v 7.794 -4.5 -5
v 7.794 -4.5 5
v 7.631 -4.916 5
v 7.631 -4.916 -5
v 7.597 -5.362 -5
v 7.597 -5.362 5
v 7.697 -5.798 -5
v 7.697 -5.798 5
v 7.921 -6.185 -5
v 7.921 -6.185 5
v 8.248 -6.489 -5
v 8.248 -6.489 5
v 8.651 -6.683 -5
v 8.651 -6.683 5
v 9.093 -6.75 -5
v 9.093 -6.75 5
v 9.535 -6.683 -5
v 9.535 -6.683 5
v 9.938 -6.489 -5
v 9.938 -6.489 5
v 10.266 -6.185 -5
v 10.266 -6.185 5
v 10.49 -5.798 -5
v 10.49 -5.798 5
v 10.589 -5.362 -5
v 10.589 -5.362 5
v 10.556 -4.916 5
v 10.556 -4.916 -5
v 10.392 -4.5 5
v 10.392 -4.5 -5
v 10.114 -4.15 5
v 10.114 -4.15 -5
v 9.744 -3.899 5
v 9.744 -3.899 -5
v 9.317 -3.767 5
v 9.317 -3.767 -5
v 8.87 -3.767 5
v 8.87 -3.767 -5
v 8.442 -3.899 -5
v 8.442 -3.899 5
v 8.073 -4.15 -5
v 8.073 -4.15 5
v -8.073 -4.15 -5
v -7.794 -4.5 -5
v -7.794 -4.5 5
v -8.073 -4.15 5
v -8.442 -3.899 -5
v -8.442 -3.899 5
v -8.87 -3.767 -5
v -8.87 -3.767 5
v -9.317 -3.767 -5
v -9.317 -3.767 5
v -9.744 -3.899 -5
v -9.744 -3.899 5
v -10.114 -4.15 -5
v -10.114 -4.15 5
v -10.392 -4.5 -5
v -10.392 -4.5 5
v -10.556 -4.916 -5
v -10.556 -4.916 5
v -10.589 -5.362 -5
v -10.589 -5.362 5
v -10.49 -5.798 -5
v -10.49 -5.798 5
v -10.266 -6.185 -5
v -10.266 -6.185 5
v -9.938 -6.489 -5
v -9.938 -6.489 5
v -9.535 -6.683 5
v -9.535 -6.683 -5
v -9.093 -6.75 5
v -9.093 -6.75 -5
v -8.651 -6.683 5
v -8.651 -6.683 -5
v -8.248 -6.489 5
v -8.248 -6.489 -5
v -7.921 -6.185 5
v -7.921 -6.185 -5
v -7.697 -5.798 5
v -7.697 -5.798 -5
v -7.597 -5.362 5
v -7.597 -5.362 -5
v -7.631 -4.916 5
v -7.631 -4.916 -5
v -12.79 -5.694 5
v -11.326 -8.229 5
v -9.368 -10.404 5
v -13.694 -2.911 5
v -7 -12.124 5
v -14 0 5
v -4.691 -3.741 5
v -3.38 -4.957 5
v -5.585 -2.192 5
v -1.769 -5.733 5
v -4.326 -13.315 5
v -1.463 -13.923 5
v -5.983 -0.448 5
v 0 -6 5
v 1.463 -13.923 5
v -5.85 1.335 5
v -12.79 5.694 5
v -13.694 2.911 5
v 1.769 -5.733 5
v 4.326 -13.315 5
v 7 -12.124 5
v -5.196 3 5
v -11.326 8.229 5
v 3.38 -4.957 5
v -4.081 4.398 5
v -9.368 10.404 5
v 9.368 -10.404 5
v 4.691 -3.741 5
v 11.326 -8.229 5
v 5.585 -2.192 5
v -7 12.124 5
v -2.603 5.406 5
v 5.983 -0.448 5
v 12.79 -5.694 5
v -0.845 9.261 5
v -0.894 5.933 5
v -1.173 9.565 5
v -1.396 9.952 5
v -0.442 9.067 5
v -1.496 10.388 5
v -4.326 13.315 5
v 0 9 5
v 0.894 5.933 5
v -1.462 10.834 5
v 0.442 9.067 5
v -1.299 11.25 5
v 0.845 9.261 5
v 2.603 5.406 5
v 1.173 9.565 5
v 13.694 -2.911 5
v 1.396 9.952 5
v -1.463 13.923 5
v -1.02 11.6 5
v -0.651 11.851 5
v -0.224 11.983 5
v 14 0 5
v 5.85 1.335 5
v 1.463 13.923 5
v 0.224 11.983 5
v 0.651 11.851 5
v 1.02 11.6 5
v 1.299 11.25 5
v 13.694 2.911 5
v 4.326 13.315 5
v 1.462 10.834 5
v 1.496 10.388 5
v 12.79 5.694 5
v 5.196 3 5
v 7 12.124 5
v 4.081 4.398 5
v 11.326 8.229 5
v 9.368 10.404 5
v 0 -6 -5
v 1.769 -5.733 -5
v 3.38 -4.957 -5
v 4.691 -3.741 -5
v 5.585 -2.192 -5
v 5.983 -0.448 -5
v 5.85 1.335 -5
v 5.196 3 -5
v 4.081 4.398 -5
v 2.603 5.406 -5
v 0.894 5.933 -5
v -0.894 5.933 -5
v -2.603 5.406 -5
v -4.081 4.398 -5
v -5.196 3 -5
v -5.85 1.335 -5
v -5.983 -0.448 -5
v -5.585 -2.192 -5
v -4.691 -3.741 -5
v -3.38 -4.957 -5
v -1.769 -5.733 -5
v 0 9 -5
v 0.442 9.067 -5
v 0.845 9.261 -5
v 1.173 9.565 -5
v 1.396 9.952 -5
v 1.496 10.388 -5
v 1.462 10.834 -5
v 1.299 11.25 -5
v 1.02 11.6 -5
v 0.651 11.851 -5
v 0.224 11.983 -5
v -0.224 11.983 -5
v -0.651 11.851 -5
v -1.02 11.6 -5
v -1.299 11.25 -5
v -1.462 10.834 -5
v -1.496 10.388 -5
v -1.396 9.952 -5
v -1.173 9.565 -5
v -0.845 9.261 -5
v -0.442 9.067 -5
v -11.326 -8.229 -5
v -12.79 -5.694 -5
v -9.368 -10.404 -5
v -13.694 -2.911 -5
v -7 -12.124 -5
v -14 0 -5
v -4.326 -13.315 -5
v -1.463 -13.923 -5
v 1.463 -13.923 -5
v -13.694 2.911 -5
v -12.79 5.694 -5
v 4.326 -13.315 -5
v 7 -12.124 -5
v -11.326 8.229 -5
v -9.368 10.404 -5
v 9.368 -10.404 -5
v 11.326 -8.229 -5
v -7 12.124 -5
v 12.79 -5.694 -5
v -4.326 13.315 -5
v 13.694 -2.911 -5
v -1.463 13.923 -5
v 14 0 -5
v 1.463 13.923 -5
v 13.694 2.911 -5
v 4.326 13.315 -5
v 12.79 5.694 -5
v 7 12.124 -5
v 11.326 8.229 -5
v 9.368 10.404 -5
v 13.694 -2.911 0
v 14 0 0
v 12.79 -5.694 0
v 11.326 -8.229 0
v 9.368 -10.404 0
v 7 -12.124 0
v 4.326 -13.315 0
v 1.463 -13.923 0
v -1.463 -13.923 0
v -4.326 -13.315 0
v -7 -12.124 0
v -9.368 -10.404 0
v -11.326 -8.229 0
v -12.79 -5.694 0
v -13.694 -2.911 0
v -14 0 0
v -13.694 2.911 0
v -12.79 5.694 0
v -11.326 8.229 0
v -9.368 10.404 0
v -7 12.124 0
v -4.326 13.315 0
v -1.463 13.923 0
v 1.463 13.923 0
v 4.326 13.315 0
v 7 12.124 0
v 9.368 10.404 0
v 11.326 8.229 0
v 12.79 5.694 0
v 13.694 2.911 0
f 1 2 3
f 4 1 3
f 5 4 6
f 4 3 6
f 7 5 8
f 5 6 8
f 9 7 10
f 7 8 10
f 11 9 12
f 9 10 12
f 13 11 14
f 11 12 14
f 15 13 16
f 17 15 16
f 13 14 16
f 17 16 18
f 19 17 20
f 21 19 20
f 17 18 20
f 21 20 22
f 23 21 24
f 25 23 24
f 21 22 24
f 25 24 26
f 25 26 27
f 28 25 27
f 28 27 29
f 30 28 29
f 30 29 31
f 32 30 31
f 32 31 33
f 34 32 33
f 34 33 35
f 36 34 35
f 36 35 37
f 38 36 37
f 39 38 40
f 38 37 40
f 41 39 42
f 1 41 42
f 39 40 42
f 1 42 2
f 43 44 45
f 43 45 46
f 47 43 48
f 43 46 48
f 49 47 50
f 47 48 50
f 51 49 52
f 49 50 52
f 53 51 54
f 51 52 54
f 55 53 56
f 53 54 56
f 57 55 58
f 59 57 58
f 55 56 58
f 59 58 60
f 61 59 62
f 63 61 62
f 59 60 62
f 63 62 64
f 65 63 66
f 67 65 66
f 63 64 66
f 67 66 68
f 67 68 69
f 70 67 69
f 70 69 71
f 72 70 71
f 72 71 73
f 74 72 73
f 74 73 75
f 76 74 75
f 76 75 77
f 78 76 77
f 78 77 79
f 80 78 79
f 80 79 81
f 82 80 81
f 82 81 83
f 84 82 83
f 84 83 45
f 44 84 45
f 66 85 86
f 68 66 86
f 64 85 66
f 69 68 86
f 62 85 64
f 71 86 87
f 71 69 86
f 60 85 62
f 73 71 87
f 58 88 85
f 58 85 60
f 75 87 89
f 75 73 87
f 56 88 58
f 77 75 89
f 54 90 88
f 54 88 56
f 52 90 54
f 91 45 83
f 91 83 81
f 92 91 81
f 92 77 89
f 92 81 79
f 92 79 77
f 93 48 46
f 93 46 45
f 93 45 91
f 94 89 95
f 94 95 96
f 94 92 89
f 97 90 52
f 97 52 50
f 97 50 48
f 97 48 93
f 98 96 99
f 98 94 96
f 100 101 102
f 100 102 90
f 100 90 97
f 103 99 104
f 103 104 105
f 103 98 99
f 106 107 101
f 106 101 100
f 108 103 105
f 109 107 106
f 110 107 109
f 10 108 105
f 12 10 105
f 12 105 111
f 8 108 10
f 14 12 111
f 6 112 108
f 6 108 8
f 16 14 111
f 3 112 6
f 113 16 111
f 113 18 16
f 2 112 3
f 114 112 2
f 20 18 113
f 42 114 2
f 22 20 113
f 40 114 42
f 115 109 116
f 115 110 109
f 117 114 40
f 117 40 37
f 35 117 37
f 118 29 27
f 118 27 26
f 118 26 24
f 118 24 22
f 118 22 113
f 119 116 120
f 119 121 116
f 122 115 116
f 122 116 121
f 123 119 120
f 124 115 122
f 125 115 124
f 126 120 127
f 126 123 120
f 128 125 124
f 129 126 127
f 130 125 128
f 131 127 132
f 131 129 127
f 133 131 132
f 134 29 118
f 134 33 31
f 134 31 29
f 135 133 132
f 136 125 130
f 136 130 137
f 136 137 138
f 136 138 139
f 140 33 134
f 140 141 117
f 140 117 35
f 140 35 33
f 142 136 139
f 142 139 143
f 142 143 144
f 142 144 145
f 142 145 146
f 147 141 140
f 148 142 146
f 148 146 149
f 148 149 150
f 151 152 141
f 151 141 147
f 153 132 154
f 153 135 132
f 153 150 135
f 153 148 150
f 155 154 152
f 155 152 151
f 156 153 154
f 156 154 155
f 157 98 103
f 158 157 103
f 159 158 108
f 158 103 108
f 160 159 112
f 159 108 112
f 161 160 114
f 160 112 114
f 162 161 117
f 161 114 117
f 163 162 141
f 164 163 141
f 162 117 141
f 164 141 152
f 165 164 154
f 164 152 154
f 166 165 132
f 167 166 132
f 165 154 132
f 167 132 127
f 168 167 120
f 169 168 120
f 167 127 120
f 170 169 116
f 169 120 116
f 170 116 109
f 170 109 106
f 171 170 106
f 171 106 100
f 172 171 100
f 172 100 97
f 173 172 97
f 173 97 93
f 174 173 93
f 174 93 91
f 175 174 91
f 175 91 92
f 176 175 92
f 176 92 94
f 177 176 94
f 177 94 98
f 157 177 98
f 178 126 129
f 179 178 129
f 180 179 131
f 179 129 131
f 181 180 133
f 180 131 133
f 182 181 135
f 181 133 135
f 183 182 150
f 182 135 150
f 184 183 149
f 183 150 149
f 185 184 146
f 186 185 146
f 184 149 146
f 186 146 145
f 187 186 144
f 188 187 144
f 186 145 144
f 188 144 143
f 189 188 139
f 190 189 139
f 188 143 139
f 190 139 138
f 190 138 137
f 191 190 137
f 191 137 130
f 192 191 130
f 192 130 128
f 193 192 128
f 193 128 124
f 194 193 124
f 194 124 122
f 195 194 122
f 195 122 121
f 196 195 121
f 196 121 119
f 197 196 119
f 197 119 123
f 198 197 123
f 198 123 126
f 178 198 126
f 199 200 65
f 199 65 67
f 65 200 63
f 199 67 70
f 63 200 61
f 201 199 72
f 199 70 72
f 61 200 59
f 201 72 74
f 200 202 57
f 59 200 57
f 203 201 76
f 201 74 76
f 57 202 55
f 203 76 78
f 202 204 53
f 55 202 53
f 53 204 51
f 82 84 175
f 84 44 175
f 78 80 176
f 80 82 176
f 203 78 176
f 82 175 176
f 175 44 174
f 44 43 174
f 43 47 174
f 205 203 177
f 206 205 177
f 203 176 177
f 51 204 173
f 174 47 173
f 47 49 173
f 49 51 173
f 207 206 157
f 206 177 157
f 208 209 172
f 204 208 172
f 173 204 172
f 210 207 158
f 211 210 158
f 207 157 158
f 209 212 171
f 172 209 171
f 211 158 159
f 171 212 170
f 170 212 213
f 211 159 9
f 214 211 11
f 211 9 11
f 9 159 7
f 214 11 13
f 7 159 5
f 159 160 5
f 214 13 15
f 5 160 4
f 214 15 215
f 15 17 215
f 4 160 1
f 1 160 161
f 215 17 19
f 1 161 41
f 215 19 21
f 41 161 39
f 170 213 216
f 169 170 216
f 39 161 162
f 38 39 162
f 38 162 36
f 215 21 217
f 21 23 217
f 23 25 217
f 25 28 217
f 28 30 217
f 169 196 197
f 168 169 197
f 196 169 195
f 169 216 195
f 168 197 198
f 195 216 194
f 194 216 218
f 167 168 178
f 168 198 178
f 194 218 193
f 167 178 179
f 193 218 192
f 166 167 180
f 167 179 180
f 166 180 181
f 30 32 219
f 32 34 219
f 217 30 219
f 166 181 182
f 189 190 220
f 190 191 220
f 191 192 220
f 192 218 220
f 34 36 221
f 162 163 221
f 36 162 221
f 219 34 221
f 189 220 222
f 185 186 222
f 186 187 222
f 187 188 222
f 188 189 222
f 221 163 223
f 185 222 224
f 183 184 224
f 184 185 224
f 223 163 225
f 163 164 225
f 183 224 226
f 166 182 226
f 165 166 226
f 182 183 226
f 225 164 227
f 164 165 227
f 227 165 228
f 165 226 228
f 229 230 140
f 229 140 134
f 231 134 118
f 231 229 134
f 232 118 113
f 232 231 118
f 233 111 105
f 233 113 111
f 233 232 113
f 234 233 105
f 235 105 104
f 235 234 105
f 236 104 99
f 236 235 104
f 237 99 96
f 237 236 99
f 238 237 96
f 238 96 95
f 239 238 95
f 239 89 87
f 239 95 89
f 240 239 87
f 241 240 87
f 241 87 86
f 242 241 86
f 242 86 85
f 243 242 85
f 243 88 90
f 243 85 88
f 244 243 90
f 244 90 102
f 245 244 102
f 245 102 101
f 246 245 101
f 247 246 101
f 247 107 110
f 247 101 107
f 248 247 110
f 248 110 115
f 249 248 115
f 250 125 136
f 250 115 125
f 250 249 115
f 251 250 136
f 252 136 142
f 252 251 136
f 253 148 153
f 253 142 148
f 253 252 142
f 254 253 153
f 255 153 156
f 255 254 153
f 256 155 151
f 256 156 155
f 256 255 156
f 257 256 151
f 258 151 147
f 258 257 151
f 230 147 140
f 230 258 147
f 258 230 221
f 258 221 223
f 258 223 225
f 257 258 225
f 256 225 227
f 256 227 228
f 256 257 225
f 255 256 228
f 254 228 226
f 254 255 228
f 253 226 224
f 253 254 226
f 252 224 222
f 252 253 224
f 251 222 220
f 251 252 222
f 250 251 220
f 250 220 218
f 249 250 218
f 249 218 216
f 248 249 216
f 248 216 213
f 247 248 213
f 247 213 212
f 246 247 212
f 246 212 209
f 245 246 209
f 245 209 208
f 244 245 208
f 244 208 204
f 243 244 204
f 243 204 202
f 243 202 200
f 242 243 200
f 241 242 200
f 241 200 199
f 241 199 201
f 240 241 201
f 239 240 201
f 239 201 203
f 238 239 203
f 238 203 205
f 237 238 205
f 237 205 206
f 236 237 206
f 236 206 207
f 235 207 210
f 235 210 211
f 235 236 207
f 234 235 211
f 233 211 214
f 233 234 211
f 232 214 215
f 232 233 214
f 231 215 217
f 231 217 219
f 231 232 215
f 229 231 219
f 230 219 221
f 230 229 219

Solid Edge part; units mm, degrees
sketch "Sketch1" plane through (0, 0, 0) normal (0, 0, 1) x (1, 0, 0)
  circle A0 centre (0, 0) radius 14
extrude "Protrusion1" add sketch "Sketch1" along normal mid plane 10
hole "Bohrung_1" at (0, 0, 5) direction (0, 0, -1) diameter 12 end up to next
hole "Bohrung_2" at (0, 10.5, 5) direction (0, 0, -1) diameter 3 end up to next
pattern_circular "Pattern1" count 3 over 360 about axis through (0, 0, 5) along (0, 0, 1) of "Bohrung_2"
properties material "Wheel2"
